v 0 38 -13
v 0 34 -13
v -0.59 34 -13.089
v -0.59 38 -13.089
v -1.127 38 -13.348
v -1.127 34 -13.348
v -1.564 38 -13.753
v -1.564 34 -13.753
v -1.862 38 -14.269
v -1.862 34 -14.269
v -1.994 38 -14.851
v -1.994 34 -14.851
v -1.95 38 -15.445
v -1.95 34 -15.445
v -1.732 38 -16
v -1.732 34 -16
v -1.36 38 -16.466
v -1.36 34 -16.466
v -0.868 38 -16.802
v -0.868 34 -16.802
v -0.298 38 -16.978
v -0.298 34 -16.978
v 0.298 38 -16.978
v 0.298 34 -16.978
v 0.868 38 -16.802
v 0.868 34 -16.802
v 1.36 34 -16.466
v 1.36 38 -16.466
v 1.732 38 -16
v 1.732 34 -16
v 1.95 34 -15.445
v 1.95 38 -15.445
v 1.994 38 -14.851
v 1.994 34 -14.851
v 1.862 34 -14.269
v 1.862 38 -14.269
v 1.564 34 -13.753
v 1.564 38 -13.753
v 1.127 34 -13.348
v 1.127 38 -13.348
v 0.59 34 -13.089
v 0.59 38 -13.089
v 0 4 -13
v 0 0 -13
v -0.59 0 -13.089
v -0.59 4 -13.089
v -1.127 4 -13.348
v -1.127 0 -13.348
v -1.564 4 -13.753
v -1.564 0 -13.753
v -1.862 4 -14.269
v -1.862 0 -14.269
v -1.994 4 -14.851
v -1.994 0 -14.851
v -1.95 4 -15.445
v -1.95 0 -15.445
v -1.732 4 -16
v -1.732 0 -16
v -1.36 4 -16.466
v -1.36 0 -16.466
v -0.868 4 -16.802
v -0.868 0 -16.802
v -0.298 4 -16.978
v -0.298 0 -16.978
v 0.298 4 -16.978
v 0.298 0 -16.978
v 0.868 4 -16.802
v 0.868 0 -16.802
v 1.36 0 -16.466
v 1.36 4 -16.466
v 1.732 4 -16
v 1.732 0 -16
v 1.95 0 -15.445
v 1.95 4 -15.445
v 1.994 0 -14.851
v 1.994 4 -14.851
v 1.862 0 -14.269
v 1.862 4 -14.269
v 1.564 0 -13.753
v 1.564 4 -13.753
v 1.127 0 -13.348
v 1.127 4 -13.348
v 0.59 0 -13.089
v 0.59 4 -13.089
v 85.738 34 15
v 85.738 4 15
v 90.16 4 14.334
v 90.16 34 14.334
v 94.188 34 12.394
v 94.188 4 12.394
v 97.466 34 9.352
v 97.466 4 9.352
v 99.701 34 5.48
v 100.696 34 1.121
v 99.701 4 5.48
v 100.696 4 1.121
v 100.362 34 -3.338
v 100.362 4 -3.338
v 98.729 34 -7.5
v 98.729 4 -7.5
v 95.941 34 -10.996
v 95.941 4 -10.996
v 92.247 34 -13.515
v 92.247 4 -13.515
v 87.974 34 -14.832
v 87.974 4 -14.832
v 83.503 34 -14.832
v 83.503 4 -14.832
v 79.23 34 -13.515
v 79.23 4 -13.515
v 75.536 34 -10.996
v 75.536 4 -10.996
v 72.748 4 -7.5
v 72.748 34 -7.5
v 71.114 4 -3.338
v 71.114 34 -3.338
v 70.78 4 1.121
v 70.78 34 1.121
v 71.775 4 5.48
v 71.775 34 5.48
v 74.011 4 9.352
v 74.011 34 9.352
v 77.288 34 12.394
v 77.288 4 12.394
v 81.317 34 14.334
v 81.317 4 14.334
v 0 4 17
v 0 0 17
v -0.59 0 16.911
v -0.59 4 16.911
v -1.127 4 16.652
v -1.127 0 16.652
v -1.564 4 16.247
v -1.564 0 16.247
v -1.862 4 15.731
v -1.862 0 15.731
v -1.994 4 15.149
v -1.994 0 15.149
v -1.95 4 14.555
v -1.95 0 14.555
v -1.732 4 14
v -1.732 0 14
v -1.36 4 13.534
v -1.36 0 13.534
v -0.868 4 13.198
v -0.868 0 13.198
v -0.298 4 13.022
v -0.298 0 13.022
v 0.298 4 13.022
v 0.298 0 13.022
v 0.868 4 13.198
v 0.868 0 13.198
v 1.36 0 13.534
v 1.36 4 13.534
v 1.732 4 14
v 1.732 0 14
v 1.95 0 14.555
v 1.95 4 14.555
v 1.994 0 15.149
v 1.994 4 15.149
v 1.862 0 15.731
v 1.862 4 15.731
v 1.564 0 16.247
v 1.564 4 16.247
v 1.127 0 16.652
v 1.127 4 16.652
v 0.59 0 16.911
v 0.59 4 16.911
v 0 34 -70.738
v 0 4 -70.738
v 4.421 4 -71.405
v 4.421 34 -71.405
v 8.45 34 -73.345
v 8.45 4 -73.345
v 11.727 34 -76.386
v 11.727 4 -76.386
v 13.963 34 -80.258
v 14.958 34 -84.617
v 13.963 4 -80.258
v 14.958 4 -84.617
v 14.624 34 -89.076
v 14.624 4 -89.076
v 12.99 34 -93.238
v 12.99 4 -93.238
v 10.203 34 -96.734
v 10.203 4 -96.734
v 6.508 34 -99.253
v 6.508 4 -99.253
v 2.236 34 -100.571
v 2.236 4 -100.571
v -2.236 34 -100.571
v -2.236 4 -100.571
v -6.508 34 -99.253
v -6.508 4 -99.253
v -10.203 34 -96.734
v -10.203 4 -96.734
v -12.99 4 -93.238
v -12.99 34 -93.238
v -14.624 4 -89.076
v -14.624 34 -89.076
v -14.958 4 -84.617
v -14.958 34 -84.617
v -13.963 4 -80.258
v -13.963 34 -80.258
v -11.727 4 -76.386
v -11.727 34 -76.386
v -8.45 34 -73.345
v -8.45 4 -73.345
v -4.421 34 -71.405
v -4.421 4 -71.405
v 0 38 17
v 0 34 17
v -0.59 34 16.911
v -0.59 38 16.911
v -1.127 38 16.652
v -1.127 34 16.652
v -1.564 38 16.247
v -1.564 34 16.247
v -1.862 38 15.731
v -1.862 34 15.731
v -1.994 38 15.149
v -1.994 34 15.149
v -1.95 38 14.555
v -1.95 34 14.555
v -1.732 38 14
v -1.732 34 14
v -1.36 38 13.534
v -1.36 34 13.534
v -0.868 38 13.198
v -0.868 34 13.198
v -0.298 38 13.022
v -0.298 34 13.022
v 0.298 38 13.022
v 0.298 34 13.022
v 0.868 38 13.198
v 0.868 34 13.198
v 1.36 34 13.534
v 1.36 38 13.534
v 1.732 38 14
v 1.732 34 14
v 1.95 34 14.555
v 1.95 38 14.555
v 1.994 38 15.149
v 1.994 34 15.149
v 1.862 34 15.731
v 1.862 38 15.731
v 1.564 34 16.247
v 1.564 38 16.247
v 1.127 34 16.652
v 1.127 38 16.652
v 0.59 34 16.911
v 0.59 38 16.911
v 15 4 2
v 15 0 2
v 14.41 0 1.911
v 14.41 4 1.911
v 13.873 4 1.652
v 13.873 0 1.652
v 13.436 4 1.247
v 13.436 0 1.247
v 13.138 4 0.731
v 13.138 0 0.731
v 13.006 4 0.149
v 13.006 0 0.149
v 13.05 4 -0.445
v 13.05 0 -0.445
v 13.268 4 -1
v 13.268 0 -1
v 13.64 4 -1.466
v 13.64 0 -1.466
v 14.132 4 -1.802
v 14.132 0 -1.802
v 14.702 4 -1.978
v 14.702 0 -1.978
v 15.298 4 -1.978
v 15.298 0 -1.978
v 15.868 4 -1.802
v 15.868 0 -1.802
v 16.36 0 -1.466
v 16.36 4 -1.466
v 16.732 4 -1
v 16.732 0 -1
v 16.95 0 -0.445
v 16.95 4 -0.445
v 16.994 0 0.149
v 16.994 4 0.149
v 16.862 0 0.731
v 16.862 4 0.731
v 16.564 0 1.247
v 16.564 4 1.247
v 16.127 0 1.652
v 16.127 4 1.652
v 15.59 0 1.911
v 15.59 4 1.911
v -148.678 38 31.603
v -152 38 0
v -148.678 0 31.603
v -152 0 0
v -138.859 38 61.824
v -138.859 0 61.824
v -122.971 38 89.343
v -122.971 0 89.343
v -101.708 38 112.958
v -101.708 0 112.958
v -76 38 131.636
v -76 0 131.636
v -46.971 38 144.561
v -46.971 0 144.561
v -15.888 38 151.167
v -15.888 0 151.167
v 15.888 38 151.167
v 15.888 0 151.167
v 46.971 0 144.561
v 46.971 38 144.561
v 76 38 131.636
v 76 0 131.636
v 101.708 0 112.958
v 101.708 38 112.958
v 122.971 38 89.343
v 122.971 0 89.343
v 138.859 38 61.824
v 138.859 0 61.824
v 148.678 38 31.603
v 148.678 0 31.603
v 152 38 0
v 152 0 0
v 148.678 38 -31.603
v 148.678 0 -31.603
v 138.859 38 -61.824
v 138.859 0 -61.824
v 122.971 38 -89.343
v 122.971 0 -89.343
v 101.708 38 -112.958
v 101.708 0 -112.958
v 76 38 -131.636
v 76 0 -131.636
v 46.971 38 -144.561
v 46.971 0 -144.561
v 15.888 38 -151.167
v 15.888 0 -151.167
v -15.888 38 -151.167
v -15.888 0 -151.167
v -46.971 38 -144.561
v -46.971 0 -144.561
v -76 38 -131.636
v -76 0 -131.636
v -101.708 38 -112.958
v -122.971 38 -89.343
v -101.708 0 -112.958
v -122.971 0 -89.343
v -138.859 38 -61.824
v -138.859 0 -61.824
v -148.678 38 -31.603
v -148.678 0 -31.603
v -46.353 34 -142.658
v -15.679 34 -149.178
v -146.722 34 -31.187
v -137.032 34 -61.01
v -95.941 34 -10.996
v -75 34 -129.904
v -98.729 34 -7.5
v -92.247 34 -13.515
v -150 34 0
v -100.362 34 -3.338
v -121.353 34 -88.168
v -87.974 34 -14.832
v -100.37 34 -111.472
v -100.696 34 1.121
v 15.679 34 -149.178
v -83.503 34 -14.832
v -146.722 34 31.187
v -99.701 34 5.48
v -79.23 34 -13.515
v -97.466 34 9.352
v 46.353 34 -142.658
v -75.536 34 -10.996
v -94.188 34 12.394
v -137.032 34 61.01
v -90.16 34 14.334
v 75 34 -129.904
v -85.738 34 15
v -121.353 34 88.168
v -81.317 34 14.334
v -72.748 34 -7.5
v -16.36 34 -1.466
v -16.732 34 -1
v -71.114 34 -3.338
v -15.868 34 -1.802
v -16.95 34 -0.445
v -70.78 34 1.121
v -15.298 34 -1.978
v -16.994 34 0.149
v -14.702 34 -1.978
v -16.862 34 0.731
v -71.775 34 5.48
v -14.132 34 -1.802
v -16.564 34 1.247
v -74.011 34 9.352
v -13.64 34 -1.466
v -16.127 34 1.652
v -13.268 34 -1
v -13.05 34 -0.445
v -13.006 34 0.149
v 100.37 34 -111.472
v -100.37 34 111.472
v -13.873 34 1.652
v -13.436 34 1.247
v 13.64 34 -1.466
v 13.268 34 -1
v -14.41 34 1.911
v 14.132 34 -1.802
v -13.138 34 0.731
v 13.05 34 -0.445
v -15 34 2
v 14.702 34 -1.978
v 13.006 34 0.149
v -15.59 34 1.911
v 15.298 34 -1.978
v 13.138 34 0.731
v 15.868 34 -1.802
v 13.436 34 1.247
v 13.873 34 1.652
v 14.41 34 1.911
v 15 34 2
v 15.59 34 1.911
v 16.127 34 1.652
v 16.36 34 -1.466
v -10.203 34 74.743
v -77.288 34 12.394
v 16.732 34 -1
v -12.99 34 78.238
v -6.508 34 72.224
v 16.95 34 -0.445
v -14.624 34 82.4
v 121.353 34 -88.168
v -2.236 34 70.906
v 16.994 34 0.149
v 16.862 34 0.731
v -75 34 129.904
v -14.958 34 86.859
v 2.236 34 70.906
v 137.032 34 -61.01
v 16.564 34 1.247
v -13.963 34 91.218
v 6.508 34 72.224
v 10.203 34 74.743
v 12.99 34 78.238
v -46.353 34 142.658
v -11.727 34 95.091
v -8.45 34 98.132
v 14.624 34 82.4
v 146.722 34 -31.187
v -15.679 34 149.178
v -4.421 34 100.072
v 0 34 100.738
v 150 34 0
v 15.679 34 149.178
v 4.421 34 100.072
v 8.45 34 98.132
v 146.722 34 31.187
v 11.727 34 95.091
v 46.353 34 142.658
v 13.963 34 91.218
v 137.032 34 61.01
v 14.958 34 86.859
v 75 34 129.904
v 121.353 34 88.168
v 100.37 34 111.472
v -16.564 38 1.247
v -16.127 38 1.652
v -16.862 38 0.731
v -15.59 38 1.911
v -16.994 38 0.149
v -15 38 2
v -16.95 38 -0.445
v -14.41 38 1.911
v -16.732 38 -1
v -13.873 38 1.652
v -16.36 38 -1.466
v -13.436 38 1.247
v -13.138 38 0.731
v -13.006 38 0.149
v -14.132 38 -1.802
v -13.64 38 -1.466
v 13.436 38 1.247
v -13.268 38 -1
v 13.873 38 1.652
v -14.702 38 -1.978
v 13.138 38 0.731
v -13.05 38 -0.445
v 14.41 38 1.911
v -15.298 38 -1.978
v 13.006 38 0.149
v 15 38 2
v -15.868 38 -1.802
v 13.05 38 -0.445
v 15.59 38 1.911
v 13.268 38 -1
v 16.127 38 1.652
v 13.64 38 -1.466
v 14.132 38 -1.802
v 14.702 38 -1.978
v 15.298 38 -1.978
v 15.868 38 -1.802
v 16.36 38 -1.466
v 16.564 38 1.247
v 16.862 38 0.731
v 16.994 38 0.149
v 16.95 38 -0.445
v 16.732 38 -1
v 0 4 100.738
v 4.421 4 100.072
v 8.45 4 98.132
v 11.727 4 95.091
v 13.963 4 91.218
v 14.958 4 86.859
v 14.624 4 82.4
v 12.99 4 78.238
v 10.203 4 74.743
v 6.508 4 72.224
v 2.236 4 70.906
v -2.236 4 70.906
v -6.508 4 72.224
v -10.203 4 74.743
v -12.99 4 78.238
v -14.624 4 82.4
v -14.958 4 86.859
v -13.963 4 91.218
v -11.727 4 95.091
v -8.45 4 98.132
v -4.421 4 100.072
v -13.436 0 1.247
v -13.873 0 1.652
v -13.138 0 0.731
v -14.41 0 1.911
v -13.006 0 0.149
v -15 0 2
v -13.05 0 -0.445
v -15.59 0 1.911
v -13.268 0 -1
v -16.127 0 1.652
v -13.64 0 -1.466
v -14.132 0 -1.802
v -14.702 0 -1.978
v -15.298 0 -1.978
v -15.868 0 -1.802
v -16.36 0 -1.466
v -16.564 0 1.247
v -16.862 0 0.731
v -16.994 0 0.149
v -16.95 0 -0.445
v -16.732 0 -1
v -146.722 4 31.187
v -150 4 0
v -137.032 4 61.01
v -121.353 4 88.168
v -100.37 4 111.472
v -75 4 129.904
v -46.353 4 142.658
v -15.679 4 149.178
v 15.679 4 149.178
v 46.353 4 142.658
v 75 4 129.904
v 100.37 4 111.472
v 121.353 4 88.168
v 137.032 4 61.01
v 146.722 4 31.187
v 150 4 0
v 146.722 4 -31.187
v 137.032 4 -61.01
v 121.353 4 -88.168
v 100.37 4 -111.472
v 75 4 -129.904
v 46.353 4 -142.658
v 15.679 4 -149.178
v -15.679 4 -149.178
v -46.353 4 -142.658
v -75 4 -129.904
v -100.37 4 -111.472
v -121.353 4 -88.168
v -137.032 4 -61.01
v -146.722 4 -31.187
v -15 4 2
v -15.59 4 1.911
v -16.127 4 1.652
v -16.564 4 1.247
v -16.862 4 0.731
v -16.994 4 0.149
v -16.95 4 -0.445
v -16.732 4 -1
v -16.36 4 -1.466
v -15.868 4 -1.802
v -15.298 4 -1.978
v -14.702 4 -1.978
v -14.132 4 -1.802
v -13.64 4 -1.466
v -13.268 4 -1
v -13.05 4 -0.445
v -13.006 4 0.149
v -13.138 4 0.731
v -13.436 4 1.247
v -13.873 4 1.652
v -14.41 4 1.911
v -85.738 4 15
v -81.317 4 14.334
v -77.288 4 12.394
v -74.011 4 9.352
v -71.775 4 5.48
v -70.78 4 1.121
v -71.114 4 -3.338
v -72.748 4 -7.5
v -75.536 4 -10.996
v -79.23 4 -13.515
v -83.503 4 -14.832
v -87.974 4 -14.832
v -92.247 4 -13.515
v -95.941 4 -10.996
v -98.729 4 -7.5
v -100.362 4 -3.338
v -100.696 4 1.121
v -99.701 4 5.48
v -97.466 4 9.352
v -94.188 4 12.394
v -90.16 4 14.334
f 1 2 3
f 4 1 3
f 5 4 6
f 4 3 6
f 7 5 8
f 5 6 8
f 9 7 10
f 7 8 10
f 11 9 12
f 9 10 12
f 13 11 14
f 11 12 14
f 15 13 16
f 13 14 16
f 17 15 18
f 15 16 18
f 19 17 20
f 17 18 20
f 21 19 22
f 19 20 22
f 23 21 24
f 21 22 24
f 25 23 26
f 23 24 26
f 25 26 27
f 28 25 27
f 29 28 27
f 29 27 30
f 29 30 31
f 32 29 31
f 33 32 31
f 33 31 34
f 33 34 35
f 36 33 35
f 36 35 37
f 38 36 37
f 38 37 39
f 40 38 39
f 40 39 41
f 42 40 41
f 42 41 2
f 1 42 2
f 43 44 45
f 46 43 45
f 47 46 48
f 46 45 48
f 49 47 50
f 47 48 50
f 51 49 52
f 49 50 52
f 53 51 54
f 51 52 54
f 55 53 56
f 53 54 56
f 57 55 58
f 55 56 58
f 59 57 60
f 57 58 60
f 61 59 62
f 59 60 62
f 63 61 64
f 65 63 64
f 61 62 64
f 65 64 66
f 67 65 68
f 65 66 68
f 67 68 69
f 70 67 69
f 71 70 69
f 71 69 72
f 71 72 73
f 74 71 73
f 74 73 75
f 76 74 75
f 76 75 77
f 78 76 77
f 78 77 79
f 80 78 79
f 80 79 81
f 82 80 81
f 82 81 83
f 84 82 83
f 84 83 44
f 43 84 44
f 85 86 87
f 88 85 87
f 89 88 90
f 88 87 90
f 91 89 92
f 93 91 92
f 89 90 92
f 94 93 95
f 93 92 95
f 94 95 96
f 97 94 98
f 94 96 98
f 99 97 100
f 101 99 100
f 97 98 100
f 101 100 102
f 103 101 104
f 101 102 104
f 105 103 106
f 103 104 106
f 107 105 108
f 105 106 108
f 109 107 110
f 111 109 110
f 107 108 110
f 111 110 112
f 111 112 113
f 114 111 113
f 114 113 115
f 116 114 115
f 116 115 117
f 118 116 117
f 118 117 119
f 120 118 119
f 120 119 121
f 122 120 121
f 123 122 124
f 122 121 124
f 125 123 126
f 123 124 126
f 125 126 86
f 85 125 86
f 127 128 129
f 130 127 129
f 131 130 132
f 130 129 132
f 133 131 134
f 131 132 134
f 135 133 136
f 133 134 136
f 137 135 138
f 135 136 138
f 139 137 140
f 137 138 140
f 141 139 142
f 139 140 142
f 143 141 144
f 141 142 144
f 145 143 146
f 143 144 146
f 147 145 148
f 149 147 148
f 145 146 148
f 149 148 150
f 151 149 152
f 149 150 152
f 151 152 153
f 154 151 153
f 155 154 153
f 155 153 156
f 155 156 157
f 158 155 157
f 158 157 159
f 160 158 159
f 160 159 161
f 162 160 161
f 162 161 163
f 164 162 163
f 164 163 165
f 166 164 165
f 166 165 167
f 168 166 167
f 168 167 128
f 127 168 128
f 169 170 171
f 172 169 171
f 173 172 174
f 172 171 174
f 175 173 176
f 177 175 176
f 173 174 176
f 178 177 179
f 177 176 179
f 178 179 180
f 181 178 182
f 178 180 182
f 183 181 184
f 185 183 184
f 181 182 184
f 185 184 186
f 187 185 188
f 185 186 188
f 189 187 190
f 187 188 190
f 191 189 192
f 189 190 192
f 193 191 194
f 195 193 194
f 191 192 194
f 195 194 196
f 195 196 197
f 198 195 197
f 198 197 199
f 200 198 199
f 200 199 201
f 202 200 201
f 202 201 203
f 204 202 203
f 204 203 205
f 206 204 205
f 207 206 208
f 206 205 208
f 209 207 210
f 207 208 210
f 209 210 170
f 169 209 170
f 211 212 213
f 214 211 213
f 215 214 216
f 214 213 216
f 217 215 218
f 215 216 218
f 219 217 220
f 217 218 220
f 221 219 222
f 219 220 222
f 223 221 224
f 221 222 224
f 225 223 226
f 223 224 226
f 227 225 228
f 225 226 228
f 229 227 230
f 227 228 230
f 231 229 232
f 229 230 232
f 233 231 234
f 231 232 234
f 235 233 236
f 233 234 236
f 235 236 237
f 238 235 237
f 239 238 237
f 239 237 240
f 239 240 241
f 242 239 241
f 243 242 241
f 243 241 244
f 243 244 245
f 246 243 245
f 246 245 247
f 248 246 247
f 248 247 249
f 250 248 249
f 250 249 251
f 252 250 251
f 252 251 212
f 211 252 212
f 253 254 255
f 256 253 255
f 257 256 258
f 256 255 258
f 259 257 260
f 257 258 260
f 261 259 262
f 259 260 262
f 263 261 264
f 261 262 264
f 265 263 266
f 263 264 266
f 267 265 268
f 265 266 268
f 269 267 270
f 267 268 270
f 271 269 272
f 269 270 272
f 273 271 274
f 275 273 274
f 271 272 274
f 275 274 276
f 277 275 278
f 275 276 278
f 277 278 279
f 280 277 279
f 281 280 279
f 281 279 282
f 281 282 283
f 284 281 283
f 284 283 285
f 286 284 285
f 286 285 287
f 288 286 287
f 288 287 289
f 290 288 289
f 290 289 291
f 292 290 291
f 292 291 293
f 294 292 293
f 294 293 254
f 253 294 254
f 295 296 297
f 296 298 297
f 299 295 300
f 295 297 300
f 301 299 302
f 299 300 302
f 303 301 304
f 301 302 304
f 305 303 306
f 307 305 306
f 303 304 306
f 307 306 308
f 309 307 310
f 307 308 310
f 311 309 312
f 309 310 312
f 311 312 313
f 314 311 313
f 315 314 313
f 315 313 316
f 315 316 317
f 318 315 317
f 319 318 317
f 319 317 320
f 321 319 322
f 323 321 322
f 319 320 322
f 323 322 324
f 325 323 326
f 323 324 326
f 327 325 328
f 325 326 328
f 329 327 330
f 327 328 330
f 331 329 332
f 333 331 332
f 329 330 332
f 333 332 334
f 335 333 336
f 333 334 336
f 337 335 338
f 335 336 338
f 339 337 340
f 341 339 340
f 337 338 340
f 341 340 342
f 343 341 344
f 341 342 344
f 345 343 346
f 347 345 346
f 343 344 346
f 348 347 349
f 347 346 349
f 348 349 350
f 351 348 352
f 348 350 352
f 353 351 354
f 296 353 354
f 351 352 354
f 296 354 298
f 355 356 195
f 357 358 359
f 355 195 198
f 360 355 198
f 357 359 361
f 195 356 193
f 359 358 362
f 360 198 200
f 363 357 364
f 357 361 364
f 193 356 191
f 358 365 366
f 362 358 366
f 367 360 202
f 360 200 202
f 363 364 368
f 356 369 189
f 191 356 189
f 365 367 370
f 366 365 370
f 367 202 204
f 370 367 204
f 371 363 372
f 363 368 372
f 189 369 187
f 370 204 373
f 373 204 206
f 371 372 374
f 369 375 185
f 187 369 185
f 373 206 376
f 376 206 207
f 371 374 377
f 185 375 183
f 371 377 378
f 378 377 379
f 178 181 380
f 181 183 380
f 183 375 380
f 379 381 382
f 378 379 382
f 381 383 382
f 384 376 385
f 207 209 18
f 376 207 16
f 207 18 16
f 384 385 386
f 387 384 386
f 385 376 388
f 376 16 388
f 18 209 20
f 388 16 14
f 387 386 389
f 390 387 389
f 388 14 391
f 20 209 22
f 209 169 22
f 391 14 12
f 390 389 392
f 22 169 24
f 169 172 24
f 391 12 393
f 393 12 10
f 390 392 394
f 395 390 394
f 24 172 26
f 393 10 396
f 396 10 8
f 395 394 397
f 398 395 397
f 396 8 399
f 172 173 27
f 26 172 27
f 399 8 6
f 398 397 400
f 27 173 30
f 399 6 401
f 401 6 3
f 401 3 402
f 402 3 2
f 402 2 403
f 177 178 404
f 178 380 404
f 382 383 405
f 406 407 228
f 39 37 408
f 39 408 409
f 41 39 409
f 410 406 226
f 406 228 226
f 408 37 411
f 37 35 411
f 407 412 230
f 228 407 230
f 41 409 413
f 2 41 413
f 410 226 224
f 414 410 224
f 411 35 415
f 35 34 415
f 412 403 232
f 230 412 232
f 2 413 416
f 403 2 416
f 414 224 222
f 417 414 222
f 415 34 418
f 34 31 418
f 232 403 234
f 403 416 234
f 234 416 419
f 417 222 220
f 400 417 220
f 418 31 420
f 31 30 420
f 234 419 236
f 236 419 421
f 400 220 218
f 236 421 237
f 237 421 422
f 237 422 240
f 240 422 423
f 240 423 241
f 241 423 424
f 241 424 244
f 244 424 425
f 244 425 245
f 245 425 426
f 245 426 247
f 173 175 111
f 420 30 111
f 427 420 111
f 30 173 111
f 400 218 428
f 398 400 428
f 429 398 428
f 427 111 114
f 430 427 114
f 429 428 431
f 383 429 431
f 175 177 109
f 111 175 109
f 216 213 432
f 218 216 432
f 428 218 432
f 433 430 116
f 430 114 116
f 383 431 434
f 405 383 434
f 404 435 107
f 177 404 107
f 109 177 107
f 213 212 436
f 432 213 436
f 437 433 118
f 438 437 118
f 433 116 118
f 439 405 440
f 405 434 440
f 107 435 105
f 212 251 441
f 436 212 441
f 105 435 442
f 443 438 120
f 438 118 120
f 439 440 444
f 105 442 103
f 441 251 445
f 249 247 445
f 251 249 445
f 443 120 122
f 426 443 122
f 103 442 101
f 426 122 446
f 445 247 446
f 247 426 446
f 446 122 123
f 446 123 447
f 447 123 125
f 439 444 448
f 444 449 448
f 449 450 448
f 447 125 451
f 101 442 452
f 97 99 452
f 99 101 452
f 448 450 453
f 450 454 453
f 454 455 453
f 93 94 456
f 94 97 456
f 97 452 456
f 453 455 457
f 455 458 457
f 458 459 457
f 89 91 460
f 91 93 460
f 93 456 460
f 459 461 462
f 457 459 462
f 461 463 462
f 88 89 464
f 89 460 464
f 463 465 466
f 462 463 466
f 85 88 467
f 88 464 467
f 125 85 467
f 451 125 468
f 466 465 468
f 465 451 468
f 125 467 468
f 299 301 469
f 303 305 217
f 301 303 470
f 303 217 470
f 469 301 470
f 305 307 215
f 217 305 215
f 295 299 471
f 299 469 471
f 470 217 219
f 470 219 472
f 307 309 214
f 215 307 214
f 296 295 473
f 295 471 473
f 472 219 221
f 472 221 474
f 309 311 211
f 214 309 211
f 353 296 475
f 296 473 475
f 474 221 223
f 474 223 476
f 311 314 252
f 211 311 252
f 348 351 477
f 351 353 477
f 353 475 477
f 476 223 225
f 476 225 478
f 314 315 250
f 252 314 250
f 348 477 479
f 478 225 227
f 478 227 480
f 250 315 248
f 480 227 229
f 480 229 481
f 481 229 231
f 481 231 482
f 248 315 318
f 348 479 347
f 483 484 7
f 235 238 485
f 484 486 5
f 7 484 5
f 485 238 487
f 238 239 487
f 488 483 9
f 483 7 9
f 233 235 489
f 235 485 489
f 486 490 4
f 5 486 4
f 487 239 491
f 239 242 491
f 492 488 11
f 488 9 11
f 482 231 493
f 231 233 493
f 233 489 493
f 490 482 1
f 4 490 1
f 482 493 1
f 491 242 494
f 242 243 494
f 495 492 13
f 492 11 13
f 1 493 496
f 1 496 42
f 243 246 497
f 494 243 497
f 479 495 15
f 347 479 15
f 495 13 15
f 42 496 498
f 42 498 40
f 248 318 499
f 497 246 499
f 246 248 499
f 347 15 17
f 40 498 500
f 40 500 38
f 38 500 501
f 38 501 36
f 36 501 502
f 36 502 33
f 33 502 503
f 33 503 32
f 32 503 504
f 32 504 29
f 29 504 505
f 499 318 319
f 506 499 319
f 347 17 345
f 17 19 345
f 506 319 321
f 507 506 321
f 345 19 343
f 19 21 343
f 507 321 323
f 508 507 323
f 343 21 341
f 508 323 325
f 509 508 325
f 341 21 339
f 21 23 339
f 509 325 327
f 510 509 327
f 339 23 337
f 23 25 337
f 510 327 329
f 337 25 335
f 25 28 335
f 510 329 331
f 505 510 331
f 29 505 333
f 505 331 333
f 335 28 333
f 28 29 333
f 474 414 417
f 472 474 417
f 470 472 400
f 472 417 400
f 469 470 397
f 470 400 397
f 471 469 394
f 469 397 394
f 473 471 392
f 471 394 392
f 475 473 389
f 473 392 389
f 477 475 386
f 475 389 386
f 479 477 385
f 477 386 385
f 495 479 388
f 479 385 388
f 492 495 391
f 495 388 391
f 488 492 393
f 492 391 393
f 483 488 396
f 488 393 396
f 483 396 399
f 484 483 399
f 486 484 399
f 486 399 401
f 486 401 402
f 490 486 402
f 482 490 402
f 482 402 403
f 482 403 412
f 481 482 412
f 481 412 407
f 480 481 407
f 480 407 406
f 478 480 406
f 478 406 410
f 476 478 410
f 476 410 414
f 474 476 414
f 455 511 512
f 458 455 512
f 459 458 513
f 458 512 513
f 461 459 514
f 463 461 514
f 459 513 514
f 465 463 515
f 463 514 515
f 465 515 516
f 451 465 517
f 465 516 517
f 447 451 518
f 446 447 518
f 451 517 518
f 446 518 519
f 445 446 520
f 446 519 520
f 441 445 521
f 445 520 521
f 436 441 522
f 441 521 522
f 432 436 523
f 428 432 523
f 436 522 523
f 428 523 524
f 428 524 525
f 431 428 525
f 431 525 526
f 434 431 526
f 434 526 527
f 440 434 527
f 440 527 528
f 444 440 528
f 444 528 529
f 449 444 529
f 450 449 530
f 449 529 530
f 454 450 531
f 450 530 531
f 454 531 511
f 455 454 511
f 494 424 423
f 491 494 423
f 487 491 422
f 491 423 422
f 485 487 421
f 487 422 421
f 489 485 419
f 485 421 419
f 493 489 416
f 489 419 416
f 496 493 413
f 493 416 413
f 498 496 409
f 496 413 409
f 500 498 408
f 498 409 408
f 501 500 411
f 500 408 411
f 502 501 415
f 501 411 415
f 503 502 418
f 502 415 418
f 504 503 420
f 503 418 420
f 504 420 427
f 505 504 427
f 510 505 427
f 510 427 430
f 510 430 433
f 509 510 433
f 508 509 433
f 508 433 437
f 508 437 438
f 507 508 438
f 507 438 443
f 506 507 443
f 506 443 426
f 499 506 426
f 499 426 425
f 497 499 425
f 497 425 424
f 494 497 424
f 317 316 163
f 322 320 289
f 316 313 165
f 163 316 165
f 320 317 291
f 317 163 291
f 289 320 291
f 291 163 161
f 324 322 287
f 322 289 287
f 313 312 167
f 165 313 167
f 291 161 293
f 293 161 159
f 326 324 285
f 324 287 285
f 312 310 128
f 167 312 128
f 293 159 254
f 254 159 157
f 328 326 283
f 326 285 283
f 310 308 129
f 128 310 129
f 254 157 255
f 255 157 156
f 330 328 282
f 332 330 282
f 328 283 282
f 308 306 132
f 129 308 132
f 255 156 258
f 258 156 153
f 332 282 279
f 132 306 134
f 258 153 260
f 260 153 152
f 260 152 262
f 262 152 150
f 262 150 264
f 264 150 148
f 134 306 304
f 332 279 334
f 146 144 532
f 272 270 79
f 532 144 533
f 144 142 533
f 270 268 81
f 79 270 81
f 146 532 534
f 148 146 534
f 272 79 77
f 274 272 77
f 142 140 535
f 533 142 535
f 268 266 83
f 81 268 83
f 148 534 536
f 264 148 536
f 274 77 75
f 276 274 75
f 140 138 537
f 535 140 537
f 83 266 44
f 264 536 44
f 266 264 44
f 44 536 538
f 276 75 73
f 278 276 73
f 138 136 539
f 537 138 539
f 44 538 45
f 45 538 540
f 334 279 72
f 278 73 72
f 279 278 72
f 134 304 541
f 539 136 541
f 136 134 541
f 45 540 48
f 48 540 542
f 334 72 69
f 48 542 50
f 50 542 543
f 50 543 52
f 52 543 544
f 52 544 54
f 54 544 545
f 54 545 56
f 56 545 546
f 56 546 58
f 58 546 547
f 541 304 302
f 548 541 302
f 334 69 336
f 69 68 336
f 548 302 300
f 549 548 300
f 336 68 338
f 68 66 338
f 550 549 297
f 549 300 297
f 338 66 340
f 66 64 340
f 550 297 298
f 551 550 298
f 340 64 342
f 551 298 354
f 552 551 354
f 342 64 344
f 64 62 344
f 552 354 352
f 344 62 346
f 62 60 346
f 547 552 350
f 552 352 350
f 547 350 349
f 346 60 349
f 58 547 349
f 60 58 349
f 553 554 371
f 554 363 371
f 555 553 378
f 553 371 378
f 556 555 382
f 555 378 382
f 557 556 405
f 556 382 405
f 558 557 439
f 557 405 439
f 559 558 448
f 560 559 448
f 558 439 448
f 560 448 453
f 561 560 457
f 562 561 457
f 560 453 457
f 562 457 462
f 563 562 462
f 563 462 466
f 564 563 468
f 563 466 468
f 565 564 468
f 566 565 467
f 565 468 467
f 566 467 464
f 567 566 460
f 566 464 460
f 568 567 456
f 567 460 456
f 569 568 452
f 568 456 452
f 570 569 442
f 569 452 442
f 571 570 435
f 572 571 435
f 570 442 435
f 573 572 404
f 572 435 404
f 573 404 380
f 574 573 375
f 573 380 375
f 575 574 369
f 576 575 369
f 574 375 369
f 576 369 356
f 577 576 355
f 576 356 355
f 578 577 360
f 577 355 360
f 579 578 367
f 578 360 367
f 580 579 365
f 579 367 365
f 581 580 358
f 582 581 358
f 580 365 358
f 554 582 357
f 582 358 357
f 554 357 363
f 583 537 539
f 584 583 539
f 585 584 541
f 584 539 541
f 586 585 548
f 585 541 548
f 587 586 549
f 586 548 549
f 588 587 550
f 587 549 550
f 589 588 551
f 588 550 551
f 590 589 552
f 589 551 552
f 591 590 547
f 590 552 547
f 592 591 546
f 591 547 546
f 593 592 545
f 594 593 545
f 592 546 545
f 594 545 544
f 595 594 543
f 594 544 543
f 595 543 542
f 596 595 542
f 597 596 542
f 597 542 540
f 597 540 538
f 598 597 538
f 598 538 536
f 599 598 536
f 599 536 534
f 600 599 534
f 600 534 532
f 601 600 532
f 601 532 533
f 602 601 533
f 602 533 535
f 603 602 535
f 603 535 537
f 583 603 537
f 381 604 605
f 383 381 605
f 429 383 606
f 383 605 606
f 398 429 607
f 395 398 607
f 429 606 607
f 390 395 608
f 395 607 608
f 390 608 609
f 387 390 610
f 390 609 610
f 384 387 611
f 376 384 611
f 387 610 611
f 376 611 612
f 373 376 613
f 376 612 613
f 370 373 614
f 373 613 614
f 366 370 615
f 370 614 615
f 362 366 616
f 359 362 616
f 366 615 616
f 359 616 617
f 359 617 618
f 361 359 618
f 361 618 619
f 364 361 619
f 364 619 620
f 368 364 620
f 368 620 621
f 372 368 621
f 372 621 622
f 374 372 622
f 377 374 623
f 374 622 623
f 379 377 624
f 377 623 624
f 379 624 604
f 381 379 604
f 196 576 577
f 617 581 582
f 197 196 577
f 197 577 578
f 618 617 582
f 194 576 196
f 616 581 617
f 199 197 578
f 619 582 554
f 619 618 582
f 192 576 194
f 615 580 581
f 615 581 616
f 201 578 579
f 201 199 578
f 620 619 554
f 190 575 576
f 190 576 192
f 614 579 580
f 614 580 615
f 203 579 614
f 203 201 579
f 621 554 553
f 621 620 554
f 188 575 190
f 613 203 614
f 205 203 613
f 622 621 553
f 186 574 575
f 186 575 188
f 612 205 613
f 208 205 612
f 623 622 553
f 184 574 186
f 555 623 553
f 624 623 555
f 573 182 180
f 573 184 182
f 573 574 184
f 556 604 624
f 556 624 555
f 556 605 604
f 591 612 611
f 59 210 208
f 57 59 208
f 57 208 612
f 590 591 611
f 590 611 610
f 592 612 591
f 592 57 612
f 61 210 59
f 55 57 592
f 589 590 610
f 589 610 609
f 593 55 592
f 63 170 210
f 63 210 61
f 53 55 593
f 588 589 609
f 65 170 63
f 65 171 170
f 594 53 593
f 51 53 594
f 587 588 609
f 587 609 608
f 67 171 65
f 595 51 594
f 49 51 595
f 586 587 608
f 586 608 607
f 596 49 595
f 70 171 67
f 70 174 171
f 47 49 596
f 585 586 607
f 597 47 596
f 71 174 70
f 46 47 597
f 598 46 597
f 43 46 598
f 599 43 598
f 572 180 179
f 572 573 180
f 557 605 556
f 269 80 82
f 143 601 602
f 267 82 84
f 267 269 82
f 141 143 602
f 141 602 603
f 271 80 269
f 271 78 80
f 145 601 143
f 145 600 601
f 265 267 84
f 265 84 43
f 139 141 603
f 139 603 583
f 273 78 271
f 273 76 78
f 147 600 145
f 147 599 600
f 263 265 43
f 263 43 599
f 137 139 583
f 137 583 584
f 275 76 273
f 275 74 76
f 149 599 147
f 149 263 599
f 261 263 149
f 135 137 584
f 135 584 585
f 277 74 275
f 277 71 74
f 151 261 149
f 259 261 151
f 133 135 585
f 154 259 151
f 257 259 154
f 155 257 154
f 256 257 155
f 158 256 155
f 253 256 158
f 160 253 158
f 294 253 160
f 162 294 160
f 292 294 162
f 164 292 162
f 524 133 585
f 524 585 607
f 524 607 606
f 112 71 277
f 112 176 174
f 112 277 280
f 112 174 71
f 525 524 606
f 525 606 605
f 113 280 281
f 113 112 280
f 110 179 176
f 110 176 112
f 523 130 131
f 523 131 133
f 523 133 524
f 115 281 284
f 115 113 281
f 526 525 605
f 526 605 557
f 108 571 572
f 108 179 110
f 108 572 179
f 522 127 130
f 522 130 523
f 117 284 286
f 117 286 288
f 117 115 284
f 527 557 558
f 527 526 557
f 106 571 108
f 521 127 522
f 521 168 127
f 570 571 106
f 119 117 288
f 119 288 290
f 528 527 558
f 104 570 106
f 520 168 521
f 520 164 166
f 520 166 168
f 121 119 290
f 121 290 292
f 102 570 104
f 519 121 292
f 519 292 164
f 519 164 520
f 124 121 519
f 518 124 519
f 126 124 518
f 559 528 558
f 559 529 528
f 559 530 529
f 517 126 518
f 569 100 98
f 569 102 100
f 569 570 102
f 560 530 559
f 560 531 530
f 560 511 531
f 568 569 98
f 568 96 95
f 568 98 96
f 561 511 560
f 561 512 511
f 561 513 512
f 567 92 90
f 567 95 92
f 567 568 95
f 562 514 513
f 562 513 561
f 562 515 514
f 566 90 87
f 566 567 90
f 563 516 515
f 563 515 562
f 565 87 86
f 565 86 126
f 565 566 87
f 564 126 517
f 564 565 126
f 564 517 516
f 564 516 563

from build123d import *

# Parameters (mm, degrees)
SKETCH1_R           = 150
BOSS_EXTRUDE1_DEPTH = 4
SKETCH2_R           = 15
BOSS_EXTRUDE2_DEPTH = 30
SKETCH3_R           = 150
BOSS_EXTRUDE3_DEPTH = 4
SKETCH5_R           = 2
CUT_EXTRUDE1_DEPTH  = 53
SKETCH6_W           = 2
SKETCH6_H           = 38


with BuildPart() as part:
    # Sketch1 → Boss-Extrude1 (new body)
    with BuildSketch(Plane(origin=(0, 0, 0), x_dir=(1, 0, 0), z_dir=(0, 1, 0))):
        with Locations(Location((0, 0, 0), (0, 0, 270))):
            Circle(SKETCH1_R)
    extrude(amount=BOSS_EXTRUDE1_DEPTH)

    # Sketch2 → Boss-Extrude2 (add)
    with BuildSketch(Plane(origin=(0, 4, 0), x_dir=(1, 0, 0), z_dir=(0, 1, 0))):
        with Locations(Location((0, 85.738299576, 0), (0, 0, 270))):
            Circle(SKETCH2_R)
        with Locations(Location((85.738299576, 0, 0), (0, 0, 270))):
            Circle(SKETCH2_R)
        with Locations(Location((0, -85.738299576, 0), (0, 0, 270))):
            Circle(SKETCH2_R)
        with Locations(Location((-85.738299576, 0, 0), (0, 0, 270))):
            Circle(SKETCH2_R)
    extrude(amount=BOSS_EXTRUDE2_DEPTH)

    # Sketch3 → Boss-Extrude3 (add)
    with BuildSketch(Plane(origin=(0, 34, 0), x_dir=(1, 0, 0), z_dir=(0, 1, 0))):
        with Locations(Location((0, 0, 0), (0, 0, 270))):
            Circle(SKETCH3_R)
    extrude(amount=BOSS_EXTRUDE3_DEPTH)

    # Sketch5 → Cut-Extrude1 (cut)
    with BuildSketch(Plane.XZ):
        with Locations(Location((0, 15, 0), (0, 0, 90))):
            Circle(SKETCH5_R)
        with Locations(Location((15, 0, 0), (0, 0, 90))):
            Circle(SKETCH5_R)
        with Locations(Location((0, -15, 0), (0, 0, 90))):
            Circle(SKETCH5_R)
        with Locations(Location((-15, 0, 0), (0, 0, 90))):
            Circle(SKETCH5_R)
    extrude(amount=-CUT_EXTRUDE1_DEPTH, mode=Mode.SUBTRACT)

    # Sweep2: sweep along a curve in space
    with BuildLine() as sweep2_path:
        ThreePointArc((0, 38, 150), (106.066017178, 38, 106.066017178), (150, 38, 0))
        ThreePointArc((150, 38, 0), (106.066017178, 38, -106.066017178), (0, 38, -150))
        ThreePointArc((0, 38, -150), (-106.066017178, 38, -106.066017178), (-150, 38, 0))
        ThreePointArc((-150, 38, 0), (-106.066017178, 38, 106.066017178), (0, 38, 150))
    # Sketch6 → Sweep2 (sweep)
    with BuildSketch(Plane(origin=(0, 0, 0), x_dir=(0, 0, -1), z_dir=(1, 0, 0))):
        with Locations((-151, 19)):
            Rectangle(SKETCH6_W, SKETCH6_H)
    sweep(path=sweep2_path.line)


solid = part.part
